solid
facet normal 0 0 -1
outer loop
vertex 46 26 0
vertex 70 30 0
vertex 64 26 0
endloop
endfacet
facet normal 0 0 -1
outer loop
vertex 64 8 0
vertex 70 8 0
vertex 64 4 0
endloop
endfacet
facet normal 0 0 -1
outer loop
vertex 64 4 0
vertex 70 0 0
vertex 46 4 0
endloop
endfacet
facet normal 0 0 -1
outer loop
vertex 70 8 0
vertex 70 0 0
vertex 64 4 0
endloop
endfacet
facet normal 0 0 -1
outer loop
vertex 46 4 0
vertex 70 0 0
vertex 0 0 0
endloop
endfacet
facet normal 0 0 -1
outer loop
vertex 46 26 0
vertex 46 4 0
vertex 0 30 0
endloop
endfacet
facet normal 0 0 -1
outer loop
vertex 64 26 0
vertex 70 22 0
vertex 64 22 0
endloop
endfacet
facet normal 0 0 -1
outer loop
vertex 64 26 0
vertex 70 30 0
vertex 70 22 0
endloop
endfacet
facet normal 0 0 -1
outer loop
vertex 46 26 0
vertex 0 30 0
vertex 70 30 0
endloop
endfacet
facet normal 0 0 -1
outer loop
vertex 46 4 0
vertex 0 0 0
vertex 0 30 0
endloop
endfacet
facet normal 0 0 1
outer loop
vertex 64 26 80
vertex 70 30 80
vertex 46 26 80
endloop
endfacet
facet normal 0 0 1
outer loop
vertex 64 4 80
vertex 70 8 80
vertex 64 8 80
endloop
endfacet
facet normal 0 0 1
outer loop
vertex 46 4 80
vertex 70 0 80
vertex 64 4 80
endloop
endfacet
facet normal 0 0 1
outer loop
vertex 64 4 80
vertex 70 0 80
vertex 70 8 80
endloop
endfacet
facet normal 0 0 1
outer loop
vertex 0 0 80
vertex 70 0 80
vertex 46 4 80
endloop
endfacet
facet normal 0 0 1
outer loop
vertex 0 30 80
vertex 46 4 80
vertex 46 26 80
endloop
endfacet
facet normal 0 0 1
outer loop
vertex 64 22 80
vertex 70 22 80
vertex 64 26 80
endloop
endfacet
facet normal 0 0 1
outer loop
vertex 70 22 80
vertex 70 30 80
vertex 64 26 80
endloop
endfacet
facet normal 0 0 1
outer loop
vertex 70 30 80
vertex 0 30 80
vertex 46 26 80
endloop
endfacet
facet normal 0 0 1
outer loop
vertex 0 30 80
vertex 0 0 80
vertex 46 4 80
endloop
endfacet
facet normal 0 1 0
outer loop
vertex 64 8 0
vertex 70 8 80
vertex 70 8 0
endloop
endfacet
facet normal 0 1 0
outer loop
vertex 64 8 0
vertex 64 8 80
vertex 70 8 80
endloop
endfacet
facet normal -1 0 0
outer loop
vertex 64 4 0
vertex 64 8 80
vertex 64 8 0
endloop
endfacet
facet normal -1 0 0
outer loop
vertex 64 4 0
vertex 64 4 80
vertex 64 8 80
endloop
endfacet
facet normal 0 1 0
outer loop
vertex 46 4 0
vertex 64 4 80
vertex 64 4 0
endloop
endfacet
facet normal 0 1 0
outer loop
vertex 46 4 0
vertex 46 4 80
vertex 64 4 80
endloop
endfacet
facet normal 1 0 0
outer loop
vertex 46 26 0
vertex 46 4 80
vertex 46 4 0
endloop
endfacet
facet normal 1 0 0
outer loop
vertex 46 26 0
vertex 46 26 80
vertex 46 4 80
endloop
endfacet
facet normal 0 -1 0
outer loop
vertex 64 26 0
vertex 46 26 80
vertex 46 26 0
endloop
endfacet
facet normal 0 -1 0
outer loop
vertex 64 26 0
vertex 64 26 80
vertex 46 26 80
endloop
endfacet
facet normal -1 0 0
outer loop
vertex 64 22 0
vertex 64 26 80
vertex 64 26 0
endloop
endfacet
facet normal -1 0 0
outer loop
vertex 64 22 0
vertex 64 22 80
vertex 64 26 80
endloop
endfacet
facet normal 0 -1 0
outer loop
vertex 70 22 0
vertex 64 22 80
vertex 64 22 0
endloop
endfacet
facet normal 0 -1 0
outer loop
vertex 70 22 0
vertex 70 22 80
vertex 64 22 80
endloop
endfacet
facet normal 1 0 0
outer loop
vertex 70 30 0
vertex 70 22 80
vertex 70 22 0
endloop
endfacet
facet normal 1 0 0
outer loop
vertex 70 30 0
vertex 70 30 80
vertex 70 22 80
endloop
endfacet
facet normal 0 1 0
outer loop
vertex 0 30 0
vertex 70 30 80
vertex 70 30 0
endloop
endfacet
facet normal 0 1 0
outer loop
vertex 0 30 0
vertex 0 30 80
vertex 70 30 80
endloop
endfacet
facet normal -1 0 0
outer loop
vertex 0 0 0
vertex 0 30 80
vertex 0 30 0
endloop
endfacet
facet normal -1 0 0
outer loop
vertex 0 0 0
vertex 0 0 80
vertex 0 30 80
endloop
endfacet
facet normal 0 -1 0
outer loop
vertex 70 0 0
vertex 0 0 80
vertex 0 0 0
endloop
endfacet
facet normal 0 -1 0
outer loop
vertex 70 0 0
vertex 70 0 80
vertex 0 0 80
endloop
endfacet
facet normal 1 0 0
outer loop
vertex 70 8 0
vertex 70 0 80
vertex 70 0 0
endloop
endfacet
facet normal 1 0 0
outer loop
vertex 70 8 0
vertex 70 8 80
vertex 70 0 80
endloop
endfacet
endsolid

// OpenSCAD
$fn = 32;

// ----------------------------------------------------------------------
// T-slot rail: 70 x 30 mm section, 80 mm long
// ----------------------------------------------------------------------

// --- parameters (mm) ---
profile_height = 80;      // extrusion height
profile_points = 12;      // points of the closed outline

profile = [[0, 0], [70, 0], [70, 8], [64, 8], [64, 4], [46, 4], [46, 26], [64, 26], [64, 22], [70, 22], [70, 30], [0, 30]];  // single closed polygon, 12 points, counter clockwise

// --- the one profile operation ---
linear_extrude(height = profile_height) polygon(points = profile);
